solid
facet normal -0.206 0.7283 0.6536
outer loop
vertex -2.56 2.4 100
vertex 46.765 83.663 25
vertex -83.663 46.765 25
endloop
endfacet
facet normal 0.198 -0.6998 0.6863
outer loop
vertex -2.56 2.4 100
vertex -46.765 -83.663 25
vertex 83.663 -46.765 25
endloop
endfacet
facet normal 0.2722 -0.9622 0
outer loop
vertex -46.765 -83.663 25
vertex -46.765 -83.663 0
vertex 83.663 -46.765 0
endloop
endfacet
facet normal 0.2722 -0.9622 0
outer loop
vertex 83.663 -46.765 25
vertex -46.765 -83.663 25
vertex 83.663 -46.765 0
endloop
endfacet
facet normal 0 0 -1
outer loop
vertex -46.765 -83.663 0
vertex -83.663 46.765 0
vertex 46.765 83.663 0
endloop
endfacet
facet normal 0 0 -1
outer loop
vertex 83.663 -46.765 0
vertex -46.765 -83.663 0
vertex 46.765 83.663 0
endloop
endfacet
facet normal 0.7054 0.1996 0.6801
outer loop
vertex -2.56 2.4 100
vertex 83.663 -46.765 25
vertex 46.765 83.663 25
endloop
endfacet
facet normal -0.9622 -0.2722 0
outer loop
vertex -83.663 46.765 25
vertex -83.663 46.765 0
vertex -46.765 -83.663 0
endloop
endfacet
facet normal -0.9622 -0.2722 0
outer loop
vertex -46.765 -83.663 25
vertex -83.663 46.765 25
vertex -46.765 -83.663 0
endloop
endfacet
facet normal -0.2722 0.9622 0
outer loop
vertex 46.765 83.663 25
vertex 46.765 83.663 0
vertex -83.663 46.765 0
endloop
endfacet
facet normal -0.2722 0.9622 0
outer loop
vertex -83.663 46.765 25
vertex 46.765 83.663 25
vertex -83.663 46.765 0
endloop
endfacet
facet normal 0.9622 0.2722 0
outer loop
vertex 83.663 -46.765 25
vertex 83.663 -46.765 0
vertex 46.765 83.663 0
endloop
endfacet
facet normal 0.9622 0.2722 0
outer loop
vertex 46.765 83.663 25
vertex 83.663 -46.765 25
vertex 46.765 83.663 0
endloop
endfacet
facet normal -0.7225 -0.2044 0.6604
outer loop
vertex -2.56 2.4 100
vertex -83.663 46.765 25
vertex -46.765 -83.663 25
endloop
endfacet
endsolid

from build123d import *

# Parameters (mm, degrees)
F1_DEPTH = 25


with BuildPart() as f1:
    # F0 (on Top) → F1 (new body)
    with BuildSketch(Plane.XY):
        Polygon((-83.662644, 46.76469), (-46.76469, -83.662644), (83.662644, -46.76469), (46.76469, 83.662644), align=None)
    extrude(amount=F1_DEPTH)

    # F1_face (on face) → F4 section 0
    with BuildSketch(Plane.XY.offset(25), mode=Mode.PRIVATE) as f4_s0:
        Polygon((83.662644, -46.76469), (46.76469, 83.662644), (-83.662644, 46.76469), (-46.76469, -83.662644), align=None)
    loft([Vertex(-2.560169, 2.400158, 100), f4_s0.sketch])


solid = f1.part
